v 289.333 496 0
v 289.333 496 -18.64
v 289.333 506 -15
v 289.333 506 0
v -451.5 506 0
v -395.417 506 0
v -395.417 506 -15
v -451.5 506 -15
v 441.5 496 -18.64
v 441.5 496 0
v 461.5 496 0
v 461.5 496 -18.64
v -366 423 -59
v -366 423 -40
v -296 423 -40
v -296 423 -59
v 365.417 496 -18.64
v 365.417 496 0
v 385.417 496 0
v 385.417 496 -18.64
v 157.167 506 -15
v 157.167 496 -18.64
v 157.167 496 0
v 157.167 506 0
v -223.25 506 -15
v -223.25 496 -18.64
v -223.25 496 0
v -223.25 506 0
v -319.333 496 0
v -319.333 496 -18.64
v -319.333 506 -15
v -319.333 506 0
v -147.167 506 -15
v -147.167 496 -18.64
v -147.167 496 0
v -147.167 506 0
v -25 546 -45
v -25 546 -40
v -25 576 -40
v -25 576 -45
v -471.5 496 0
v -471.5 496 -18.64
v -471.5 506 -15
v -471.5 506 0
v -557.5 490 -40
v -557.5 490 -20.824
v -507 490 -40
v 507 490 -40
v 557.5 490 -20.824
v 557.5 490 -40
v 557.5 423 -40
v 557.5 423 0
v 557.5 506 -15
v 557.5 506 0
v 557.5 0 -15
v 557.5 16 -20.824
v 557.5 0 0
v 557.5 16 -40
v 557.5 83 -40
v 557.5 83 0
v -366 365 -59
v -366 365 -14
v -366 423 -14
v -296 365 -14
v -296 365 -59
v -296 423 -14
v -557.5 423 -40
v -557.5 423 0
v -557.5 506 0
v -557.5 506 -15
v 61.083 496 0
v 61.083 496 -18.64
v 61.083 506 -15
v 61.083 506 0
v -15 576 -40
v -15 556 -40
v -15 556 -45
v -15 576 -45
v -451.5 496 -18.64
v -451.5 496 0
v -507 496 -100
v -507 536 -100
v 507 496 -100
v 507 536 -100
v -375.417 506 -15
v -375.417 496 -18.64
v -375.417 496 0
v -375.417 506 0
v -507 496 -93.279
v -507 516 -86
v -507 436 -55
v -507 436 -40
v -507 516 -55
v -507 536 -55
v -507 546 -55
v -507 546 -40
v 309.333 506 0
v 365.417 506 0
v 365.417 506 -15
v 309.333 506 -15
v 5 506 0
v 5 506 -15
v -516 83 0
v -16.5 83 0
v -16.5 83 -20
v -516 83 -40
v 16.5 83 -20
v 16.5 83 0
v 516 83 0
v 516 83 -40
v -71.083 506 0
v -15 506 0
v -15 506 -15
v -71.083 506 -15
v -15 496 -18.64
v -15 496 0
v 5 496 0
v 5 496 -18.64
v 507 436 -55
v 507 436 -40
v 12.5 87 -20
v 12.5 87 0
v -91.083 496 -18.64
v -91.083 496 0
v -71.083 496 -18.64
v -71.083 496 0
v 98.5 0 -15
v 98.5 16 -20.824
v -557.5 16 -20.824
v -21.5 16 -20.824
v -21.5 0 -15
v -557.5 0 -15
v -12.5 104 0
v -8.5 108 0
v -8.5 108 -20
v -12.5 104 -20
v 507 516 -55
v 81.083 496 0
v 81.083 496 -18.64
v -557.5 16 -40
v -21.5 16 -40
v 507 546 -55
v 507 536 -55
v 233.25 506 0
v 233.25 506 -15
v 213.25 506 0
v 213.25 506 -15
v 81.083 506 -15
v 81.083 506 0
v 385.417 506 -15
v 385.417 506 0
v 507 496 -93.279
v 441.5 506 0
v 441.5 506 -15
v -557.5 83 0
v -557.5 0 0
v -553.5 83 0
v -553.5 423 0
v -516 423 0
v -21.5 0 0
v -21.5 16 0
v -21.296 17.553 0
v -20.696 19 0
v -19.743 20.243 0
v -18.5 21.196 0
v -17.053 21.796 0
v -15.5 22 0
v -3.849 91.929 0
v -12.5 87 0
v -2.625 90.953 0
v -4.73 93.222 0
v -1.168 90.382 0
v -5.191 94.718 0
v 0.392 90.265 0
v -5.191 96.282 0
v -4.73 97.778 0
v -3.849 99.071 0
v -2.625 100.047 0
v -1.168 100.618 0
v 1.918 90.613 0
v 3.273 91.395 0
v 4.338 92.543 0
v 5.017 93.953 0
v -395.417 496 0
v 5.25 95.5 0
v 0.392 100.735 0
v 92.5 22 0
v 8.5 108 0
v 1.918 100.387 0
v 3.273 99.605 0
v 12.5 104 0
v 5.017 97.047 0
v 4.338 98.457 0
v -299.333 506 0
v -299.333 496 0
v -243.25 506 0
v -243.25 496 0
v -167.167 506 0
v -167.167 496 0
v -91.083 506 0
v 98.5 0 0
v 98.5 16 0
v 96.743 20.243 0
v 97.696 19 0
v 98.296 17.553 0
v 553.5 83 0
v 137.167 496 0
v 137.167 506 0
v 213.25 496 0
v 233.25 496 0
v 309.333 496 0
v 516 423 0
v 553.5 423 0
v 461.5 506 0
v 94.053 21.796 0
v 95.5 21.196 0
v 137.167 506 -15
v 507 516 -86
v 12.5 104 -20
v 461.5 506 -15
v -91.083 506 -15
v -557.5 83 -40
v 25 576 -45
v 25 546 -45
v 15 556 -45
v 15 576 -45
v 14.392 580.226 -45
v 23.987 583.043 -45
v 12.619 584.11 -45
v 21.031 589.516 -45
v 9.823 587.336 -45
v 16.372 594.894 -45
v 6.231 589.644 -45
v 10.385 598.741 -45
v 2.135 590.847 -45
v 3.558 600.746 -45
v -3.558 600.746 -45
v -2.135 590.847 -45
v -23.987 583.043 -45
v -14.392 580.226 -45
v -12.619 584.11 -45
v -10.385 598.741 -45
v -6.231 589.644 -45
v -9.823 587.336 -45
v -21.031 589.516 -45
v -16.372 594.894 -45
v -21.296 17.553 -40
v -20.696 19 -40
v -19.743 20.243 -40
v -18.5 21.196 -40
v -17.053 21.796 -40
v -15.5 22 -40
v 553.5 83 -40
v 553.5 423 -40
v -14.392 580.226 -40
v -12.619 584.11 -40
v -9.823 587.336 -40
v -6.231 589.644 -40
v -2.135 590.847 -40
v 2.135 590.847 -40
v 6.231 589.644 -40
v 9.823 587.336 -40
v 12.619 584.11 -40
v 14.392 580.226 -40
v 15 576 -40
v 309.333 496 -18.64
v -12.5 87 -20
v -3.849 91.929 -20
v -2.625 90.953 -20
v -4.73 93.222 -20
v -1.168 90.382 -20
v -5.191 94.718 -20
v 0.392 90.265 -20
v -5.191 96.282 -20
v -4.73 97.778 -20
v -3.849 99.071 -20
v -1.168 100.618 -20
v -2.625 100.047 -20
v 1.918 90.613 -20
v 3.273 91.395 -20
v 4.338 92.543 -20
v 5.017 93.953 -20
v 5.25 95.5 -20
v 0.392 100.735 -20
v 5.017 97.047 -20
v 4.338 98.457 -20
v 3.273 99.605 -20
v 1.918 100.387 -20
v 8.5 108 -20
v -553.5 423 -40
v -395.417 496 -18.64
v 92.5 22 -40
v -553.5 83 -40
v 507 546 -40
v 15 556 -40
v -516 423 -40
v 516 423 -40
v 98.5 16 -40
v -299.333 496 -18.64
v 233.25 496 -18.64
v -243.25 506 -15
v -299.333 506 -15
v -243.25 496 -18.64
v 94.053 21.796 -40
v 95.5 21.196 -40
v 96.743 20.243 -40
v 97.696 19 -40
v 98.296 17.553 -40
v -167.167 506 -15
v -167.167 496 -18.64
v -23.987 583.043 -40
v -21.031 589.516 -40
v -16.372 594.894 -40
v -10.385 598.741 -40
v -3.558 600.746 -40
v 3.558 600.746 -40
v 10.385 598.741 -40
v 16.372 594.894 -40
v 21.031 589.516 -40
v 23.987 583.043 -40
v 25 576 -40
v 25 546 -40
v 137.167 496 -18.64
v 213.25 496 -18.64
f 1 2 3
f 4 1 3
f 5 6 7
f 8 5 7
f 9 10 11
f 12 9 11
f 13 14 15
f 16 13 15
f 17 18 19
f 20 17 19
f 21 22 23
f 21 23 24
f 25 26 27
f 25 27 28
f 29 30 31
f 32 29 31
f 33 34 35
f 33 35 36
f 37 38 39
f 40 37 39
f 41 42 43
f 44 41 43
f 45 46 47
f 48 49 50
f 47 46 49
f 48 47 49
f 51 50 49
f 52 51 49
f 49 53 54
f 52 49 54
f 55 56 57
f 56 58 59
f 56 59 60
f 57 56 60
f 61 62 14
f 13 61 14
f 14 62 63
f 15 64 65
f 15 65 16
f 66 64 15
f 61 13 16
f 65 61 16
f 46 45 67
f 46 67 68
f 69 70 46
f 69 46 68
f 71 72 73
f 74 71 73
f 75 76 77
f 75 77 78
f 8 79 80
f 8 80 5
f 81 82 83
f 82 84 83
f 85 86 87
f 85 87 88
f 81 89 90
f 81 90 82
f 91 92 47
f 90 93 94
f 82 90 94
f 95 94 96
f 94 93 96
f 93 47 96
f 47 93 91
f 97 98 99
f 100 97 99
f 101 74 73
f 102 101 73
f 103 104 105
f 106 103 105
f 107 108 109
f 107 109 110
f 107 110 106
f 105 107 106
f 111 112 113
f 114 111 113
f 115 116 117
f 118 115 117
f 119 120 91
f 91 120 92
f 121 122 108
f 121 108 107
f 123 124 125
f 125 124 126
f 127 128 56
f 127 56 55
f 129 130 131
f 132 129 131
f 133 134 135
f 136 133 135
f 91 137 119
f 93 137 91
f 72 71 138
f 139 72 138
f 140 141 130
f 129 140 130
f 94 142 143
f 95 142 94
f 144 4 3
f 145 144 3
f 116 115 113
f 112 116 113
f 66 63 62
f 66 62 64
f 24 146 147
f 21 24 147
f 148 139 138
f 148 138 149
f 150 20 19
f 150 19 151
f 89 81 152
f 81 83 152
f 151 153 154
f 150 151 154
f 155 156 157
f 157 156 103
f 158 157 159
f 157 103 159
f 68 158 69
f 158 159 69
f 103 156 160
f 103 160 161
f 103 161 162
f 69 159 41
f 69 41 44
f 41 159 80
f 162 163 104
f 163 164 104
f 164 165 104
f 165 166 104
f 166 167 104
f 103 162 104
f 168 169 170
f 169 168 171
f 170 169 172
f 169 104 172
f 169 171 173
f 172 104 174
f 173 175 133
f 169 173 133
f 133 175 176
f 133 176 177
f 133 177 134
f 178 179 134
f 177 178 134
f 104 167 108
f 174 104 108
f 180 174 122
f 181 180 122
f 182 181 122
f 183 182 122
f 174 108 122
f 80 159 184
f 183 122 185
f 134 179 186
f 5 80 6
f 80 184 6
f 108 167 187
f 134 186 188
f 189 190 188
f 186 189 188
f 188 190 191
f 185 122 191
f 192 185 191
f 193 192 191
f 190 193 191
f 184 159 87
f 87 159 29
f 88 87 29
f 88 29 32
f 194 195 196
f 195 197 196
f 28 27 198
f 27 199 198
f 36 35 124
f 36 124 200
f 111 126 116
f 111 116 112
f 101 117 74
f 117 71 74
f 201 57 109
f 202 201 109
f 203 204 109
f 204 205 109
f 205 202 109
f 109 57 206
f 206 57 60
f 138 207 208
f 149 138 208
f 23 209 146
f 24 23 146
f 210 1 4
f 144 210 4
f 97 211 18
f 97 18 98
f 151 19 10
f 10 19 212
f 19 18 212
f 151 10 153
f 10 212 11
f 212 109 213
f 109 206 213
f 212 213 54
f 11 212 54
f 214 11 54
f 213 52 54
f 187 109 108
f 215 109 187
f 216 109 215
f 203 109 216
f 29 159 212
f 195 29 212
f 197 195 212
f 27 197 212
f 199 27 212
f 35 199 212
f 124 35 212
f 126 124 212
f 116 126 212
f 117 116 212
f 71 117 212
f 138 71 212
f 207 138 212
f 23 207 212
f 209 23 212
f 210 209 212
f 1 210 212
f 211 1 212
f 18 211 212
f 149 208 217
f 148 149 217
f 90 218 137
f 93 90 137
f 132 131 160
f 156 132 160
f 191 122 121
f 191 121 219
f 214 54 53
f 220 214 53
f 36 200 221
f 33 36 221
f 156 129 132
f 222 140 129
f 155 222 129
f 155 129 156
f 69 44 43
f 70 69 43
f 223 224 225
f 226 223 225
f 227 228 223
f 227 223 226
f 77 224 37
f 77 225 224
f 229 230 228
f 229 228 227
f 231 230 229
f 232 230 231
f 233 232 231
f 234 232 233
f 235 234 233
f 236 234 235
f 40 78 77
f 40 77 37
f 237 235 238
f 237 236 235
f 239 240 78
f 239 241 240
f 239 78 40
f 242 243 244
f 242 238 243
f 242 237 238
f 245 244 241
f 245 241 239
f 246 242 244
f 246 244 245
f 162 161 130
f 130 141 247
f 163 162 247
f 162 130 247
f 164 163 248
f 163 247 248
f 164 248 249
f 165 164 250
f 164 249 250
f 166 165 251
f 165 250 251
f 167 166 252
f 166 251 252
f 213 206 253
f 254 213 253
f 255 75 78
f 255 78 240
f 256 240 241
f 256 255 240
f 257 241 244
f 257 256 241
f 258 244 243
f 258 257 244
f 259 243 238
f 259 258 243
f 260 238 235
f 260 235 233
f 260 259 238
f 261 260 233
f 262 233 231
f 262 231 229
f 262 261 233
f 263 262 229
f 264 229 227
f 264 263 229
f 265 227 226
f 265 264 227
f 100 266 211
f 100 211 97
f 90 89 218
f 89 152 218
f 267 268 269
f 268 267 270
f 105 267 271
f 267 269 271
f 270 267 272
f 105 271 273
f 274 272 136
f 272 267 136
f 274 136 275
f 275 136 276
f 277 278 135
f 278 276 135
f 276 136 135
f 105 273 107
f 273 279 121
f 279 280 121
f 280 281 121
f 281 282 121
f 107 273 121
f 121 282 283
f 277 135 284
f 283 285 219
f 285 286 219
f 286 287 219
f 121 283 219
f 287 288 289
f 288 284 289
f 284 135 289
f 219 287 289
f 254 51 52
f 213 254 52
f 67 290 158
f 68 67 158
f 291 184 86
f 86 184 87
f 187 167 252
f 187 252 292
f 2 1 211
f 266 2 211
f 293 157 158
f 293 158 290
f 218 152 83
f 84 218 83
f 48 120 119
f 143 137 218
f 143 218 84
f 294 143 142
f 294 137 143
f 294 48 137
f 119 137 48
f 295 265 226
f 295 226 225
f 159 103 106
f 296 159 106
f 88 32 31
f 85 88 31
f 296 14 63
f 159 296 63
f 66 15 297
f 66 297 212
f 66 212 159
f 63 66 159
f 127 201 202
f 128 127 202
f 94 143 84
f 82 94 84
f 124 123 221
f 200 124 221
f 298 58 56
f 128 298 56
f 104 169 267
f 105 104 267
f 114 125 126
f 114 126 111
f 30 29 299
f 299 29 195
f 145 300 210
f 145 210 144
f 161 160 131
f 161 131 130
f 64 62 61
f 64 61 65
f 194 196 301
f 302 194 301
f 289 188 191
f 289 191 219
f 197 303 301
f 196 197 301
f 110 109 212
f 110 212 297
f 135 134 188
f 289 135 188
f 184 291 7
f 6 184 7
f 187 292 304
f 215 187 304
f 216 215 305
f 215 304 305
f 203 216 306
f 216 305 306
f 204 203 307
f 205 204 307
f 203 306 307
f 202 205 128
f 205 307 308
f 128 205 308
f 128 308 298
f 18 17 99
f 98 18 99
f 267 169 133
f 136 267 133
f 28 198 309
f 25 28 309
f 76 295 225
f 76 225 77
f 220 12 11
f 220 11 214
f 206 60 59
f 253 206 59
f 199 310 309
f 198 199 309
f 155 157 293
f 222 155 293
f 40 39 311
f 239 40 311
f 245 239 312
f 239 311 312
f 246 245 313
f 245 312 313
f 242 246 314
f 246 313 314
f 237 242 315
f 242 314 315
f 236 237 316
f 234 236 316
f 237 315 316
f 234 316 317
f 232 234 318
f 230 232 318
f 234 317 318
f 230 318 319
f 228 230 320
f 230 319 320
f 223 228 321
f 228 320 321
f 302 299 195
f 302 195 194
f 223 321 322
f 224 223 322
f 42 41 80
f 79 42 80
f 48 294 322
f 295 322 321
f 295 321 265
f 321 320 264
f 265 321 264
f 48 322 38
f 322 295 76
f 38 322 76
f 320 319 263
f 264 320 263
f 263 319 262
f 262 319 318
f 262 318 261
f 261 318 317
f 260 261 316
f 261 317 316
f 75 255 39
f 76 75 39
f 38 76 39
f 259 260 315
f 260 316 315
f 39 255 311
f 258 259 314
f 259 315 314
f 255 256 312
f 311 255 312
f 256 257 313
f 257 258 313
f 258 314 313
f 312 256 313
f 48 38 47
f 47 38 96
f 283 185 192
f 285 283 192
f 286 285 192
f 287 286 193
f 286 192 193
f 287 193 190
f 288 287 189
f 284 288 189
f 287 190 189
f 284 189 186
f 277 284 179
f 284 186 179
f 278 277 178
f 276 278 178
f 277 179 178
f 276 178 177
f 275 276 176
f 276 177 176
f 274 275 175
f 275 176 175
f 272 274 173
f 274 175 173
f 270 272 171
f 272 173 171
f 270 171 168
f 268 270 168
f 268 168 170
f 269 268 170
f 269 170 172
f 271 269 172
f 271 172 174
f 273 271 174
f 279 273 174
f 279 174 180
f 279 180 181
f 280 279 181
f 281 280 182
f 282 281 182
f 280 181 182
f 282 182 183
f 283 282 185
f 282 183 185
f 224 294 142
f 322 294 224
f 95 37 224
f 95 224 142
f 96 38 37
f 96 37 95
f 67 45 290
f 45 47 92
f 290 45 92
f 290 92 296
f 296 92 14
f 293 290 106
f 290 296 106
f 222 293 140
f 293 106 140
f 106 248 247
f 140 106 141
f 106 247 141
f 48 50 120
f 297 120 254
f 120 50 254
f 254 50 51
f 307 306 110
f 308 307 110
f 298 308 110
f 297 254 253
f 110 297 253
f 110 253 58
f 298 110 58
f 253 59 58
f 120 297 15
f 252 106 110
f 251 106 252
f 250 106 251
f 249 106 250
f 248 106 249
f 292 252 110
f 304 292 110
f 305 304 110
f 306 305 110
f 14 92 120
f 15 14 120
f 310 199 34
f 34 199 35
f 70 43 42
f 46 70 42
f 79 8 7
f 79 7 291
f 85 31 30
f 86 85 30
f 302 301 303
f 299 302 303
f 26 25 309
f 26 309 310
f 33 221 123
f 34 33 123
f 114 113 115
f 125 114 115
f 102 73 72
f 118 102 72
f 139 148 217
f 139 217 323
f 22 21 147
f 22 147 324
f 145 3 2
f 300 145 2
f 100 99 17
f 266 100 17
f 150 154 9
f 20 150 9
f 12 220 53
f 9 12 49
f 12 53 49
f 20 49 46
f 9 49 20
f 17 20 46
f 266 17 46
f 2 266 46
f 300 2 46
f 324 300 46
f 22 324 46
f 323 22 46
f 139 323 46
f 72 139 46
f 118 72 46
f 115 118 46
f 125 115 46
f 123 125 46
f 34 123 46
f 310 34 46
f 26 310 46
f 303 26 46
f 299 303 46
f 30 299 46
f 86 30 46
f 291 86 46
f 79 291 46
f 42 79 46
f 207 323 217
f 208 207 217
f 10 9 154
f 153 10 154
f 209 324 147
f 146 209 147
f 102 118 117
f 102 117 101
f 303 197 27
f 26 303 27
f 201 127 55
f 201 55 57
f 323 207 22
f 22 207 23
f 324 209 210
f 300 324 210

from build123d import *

# Parameters (mm, degrees)
BOSS_EXTRUDE1_DEPTH  = 557.5
SKETCH2_W            = 37.5
SKETCH2_H            = 40
BOSS_EXTRUDE2_DEPTH  = 340
BOSS_EXTRUDE3_DEPTH  = 1115
SKETCH4_W            = 120
SKETCH4_H            = 22
CUT_EXTRUDE1_DEPTH   = 754.951092578
FILLET1_R            = 6
SKETCH8_W            = 20
SKETCH8_H            = 10
CUT_EXTRUDE3_DEPTH   = 754.951092578
SKETCH9_W            = 25
SKETCH9_H            = 25
SKETCH9_R            = 5.25
BOSS_EXTRUDE6_DEPTH  = 20
CHAMFER1_SIZE        = 4
SKETCH10_W           = 1014
SKETCH10_H           = 110
BOSS_EXTRUDE7_DEPTH  = 15
BOSS_EXTRUDE8_DEPTH  = 507
BOSS_EXTRUDE9_DEPTH  = 5
BOSS_EXTRUDE10_START = -14
SKETCH13_W           = 70
SKETCH13_H           = 58
BOSS_EXTRUDE10_DEPTH = 45


with BuildPart() as part:
    # Sketch1 → Boss-Extrude1 (new, symmetric)
    with BuildSketch(Plane(origin=(0, 0, 0), x_dir=(0, 0, -1), z_dir=(1, 0, 0))):
        Polygon((0, 0), (0, 83), (40, 83), (40, 16), (20.823523748, 16), (15, 0), align=None)
    extrude(amount=BOSS_EXTRUDE1_DEPTH, both=True)

    # Sketch2 → Boss-Extrude2 (add)
    with BuildSketch(Plane(origin=(0, 83, 0), x_dir=(1, 0, 0), z_dir=(0, 1, 0))):
        with Locations((-534.75, 20)):
            Rectangle(SKETCH2_W, SKETCH2_H)
        with Locations((534.75, 20)):
            Rectangle(SKETCH2_W, SKETCH2_H)
    extrude(amount=BOSS_EXTRUDE2_DEPTH)

    # Sketch3 → Boss-Extrude3 (add)
    with BuildSketch(Plane(origin=(557.5, 0, 0), x_dir=(0, 0, -1), z_dir=(1, 0, 0))):
        Polygon((0, 423), (0, 506), (15, 506), (20.823523748, 490), (40, 490), (40, 423), align=None)
    extrude(amount=-BOSS_EXTRUDE3_DEPTH)

    # Sketch4 → Cut-Extrude1 (cut, through all)
    with BuildSketch(Plane.XY):
        with Locations((38.5, 11)):
            Rectangle(SKETCH4_W, SKETCH4_H)
    extrude(amount=-CUT_EXTRUDE1_DEPTH, mode=Mode.SUBTRACT)

    # Fillet1
    fillet1_edges = [part.edges().sort_by_distance(p)[0] for p in [
        (98.5, 22, -20),
        (-21.5, 22, -20),
    ]]
    fillet(fillet1_edges, radius=FILLET1_R)

    # Sketch8 → Cut-Extrude3 (cut, through all)
    with BuildSketch(Plane.XY):
        with Locations((-461.5, 501)):
            Rectangle(SKETCH8_W, SKETCH8_H)
        with Locations((-385.416666667, 501)):
            Rectangle(SKETCH8_W, SKETCH8_H)
        with Locations((-309.333333333, 501)):
            Rectangle(SKETCH8_W, SKETCH8_H)
        with Locations((-233.25, 501)):
            Rectangle(SKETCH8_W, SKETCH8_H)
        with Locations((-157.166666667, 501)):
            Rectangle(SKETCH8_W, SKETCH8_H)
        with Locations((-81.083333333, 501)):
            Rectangle(SKETCH8_W, SKETCH8_H)
        with Locations((-5, 501)):
            Rectangle(SKETCH8_W, SKETCH8_H)
        with Locations((71.083333333, 501)):
            Rectangle(SKETCH8_W, SKETCH8_H)
        with Locations((147.166666667, 501)):
            Rectangle(SKETCH8_W, SKETCH8_H)
        with Locations((223.25, 501)):
            Rectangle(SKETCH8_W, SKETCH8_H)
        with Locations((299.333333333, 501)):
            Rectangle(SKETCH8_W, SKETCH8_H)
        with Locations((375.416666667, 501)):
            Rectangle(SKETCH8_W, SKETCH8_H)
        with Locations((451.5, 501)):
            Rectangle(SKETCH8_W, SKETCH8_H)
    extrude(amount=-CUT_EXTRUDE3_DEPTH, mode=Mode.SUBTRACT)

    # Sketch9 → Boss-Extrude6 (add)
    with BuildSketch(Plane.XY):
        with Locations((0, 95.5)):
            Rectangle(SKETCH9_W, SKETCH9_H)
        with Locations((0, 95.5)):
            Circle(SKETCH9_R, mode=Mode.SUBTRACT)
    extrude(amount=-BOSS_EXTRUDE6_DEPTH)

    # Chamfer1
    chamfer1_edges = [part.edges().sort_by_distance(p)[0] for p in [
        (-12.5, 83, -10),
        (-12.5, 108, -10),
        (12.5, 108, -10),
        (12.5, 83, -10),
    ]]
    chamfer(chamfer1_edges, length=CHAMFER1_SIZE)

    # Sketch10 → Boss-Extrude7 (add)
    with BuildSketch(Plane(origin=(0, 0, -40), x_dir=(-1, 0, 0), z_dir=(0, 0, -1))):
        with Locations((0, 491)):
            Rectangle(SKETCH10_W, SKETCH10_H)
    extrude(amount=BOSS_EXTRUDE7_DEPTH)

    # Sketch11 → Boss-Extrude8 (add, symmetric)
    with BuildSketch(Plane(origin=(0, 0, 0), x_dir=(0, 0, -1), z_dir=(1, 0, 0))):
        Polygon((55, 536), (100, 536), (100, 496), (93.279404685, 496), (86, 516), (55, 516), align=None)
    extrude(amount=BOSS_EXTRUDE8_DEPTH, both=True)

    # Sketch12 → Boss-Extrude9 (add)
    with BuildSketch(Plane.XY.offset(-40)):
        with BuildLine():
            Line((-25, 546), (-25, 576))
            ThreePointArc((-25, 576), (0, 601), (25, 576))
            Line((25, 576), (25, 546))
            Line((25, 546), (-25, 546))
        make_face()
        with BuildLine():
            Line((-15, 556), (-15, 576))
            ThreePointArc((-15, 576), (0, 591), (15, 576))
            Line((15, 576), (15, 556))
            Line((15, 556), (-15, 556))
        make_face(mode=Mode.SUBTRACT)
    extrude(amount=-BOSS_EXTRUDE9_DEPTH)

    # Sketch13 → Boss-Extrude10 (add)
    with BuildSketch(Plane.XY.offset(BOSS_EXTRUDE10_START)):
        with Locations((-331, 394)):
            Rectangle(SKETCH13_W, SKETCH13_H)
    extrude(amount=-BOSS_EXTRUDE10_DEPTH)


solid = part.part
